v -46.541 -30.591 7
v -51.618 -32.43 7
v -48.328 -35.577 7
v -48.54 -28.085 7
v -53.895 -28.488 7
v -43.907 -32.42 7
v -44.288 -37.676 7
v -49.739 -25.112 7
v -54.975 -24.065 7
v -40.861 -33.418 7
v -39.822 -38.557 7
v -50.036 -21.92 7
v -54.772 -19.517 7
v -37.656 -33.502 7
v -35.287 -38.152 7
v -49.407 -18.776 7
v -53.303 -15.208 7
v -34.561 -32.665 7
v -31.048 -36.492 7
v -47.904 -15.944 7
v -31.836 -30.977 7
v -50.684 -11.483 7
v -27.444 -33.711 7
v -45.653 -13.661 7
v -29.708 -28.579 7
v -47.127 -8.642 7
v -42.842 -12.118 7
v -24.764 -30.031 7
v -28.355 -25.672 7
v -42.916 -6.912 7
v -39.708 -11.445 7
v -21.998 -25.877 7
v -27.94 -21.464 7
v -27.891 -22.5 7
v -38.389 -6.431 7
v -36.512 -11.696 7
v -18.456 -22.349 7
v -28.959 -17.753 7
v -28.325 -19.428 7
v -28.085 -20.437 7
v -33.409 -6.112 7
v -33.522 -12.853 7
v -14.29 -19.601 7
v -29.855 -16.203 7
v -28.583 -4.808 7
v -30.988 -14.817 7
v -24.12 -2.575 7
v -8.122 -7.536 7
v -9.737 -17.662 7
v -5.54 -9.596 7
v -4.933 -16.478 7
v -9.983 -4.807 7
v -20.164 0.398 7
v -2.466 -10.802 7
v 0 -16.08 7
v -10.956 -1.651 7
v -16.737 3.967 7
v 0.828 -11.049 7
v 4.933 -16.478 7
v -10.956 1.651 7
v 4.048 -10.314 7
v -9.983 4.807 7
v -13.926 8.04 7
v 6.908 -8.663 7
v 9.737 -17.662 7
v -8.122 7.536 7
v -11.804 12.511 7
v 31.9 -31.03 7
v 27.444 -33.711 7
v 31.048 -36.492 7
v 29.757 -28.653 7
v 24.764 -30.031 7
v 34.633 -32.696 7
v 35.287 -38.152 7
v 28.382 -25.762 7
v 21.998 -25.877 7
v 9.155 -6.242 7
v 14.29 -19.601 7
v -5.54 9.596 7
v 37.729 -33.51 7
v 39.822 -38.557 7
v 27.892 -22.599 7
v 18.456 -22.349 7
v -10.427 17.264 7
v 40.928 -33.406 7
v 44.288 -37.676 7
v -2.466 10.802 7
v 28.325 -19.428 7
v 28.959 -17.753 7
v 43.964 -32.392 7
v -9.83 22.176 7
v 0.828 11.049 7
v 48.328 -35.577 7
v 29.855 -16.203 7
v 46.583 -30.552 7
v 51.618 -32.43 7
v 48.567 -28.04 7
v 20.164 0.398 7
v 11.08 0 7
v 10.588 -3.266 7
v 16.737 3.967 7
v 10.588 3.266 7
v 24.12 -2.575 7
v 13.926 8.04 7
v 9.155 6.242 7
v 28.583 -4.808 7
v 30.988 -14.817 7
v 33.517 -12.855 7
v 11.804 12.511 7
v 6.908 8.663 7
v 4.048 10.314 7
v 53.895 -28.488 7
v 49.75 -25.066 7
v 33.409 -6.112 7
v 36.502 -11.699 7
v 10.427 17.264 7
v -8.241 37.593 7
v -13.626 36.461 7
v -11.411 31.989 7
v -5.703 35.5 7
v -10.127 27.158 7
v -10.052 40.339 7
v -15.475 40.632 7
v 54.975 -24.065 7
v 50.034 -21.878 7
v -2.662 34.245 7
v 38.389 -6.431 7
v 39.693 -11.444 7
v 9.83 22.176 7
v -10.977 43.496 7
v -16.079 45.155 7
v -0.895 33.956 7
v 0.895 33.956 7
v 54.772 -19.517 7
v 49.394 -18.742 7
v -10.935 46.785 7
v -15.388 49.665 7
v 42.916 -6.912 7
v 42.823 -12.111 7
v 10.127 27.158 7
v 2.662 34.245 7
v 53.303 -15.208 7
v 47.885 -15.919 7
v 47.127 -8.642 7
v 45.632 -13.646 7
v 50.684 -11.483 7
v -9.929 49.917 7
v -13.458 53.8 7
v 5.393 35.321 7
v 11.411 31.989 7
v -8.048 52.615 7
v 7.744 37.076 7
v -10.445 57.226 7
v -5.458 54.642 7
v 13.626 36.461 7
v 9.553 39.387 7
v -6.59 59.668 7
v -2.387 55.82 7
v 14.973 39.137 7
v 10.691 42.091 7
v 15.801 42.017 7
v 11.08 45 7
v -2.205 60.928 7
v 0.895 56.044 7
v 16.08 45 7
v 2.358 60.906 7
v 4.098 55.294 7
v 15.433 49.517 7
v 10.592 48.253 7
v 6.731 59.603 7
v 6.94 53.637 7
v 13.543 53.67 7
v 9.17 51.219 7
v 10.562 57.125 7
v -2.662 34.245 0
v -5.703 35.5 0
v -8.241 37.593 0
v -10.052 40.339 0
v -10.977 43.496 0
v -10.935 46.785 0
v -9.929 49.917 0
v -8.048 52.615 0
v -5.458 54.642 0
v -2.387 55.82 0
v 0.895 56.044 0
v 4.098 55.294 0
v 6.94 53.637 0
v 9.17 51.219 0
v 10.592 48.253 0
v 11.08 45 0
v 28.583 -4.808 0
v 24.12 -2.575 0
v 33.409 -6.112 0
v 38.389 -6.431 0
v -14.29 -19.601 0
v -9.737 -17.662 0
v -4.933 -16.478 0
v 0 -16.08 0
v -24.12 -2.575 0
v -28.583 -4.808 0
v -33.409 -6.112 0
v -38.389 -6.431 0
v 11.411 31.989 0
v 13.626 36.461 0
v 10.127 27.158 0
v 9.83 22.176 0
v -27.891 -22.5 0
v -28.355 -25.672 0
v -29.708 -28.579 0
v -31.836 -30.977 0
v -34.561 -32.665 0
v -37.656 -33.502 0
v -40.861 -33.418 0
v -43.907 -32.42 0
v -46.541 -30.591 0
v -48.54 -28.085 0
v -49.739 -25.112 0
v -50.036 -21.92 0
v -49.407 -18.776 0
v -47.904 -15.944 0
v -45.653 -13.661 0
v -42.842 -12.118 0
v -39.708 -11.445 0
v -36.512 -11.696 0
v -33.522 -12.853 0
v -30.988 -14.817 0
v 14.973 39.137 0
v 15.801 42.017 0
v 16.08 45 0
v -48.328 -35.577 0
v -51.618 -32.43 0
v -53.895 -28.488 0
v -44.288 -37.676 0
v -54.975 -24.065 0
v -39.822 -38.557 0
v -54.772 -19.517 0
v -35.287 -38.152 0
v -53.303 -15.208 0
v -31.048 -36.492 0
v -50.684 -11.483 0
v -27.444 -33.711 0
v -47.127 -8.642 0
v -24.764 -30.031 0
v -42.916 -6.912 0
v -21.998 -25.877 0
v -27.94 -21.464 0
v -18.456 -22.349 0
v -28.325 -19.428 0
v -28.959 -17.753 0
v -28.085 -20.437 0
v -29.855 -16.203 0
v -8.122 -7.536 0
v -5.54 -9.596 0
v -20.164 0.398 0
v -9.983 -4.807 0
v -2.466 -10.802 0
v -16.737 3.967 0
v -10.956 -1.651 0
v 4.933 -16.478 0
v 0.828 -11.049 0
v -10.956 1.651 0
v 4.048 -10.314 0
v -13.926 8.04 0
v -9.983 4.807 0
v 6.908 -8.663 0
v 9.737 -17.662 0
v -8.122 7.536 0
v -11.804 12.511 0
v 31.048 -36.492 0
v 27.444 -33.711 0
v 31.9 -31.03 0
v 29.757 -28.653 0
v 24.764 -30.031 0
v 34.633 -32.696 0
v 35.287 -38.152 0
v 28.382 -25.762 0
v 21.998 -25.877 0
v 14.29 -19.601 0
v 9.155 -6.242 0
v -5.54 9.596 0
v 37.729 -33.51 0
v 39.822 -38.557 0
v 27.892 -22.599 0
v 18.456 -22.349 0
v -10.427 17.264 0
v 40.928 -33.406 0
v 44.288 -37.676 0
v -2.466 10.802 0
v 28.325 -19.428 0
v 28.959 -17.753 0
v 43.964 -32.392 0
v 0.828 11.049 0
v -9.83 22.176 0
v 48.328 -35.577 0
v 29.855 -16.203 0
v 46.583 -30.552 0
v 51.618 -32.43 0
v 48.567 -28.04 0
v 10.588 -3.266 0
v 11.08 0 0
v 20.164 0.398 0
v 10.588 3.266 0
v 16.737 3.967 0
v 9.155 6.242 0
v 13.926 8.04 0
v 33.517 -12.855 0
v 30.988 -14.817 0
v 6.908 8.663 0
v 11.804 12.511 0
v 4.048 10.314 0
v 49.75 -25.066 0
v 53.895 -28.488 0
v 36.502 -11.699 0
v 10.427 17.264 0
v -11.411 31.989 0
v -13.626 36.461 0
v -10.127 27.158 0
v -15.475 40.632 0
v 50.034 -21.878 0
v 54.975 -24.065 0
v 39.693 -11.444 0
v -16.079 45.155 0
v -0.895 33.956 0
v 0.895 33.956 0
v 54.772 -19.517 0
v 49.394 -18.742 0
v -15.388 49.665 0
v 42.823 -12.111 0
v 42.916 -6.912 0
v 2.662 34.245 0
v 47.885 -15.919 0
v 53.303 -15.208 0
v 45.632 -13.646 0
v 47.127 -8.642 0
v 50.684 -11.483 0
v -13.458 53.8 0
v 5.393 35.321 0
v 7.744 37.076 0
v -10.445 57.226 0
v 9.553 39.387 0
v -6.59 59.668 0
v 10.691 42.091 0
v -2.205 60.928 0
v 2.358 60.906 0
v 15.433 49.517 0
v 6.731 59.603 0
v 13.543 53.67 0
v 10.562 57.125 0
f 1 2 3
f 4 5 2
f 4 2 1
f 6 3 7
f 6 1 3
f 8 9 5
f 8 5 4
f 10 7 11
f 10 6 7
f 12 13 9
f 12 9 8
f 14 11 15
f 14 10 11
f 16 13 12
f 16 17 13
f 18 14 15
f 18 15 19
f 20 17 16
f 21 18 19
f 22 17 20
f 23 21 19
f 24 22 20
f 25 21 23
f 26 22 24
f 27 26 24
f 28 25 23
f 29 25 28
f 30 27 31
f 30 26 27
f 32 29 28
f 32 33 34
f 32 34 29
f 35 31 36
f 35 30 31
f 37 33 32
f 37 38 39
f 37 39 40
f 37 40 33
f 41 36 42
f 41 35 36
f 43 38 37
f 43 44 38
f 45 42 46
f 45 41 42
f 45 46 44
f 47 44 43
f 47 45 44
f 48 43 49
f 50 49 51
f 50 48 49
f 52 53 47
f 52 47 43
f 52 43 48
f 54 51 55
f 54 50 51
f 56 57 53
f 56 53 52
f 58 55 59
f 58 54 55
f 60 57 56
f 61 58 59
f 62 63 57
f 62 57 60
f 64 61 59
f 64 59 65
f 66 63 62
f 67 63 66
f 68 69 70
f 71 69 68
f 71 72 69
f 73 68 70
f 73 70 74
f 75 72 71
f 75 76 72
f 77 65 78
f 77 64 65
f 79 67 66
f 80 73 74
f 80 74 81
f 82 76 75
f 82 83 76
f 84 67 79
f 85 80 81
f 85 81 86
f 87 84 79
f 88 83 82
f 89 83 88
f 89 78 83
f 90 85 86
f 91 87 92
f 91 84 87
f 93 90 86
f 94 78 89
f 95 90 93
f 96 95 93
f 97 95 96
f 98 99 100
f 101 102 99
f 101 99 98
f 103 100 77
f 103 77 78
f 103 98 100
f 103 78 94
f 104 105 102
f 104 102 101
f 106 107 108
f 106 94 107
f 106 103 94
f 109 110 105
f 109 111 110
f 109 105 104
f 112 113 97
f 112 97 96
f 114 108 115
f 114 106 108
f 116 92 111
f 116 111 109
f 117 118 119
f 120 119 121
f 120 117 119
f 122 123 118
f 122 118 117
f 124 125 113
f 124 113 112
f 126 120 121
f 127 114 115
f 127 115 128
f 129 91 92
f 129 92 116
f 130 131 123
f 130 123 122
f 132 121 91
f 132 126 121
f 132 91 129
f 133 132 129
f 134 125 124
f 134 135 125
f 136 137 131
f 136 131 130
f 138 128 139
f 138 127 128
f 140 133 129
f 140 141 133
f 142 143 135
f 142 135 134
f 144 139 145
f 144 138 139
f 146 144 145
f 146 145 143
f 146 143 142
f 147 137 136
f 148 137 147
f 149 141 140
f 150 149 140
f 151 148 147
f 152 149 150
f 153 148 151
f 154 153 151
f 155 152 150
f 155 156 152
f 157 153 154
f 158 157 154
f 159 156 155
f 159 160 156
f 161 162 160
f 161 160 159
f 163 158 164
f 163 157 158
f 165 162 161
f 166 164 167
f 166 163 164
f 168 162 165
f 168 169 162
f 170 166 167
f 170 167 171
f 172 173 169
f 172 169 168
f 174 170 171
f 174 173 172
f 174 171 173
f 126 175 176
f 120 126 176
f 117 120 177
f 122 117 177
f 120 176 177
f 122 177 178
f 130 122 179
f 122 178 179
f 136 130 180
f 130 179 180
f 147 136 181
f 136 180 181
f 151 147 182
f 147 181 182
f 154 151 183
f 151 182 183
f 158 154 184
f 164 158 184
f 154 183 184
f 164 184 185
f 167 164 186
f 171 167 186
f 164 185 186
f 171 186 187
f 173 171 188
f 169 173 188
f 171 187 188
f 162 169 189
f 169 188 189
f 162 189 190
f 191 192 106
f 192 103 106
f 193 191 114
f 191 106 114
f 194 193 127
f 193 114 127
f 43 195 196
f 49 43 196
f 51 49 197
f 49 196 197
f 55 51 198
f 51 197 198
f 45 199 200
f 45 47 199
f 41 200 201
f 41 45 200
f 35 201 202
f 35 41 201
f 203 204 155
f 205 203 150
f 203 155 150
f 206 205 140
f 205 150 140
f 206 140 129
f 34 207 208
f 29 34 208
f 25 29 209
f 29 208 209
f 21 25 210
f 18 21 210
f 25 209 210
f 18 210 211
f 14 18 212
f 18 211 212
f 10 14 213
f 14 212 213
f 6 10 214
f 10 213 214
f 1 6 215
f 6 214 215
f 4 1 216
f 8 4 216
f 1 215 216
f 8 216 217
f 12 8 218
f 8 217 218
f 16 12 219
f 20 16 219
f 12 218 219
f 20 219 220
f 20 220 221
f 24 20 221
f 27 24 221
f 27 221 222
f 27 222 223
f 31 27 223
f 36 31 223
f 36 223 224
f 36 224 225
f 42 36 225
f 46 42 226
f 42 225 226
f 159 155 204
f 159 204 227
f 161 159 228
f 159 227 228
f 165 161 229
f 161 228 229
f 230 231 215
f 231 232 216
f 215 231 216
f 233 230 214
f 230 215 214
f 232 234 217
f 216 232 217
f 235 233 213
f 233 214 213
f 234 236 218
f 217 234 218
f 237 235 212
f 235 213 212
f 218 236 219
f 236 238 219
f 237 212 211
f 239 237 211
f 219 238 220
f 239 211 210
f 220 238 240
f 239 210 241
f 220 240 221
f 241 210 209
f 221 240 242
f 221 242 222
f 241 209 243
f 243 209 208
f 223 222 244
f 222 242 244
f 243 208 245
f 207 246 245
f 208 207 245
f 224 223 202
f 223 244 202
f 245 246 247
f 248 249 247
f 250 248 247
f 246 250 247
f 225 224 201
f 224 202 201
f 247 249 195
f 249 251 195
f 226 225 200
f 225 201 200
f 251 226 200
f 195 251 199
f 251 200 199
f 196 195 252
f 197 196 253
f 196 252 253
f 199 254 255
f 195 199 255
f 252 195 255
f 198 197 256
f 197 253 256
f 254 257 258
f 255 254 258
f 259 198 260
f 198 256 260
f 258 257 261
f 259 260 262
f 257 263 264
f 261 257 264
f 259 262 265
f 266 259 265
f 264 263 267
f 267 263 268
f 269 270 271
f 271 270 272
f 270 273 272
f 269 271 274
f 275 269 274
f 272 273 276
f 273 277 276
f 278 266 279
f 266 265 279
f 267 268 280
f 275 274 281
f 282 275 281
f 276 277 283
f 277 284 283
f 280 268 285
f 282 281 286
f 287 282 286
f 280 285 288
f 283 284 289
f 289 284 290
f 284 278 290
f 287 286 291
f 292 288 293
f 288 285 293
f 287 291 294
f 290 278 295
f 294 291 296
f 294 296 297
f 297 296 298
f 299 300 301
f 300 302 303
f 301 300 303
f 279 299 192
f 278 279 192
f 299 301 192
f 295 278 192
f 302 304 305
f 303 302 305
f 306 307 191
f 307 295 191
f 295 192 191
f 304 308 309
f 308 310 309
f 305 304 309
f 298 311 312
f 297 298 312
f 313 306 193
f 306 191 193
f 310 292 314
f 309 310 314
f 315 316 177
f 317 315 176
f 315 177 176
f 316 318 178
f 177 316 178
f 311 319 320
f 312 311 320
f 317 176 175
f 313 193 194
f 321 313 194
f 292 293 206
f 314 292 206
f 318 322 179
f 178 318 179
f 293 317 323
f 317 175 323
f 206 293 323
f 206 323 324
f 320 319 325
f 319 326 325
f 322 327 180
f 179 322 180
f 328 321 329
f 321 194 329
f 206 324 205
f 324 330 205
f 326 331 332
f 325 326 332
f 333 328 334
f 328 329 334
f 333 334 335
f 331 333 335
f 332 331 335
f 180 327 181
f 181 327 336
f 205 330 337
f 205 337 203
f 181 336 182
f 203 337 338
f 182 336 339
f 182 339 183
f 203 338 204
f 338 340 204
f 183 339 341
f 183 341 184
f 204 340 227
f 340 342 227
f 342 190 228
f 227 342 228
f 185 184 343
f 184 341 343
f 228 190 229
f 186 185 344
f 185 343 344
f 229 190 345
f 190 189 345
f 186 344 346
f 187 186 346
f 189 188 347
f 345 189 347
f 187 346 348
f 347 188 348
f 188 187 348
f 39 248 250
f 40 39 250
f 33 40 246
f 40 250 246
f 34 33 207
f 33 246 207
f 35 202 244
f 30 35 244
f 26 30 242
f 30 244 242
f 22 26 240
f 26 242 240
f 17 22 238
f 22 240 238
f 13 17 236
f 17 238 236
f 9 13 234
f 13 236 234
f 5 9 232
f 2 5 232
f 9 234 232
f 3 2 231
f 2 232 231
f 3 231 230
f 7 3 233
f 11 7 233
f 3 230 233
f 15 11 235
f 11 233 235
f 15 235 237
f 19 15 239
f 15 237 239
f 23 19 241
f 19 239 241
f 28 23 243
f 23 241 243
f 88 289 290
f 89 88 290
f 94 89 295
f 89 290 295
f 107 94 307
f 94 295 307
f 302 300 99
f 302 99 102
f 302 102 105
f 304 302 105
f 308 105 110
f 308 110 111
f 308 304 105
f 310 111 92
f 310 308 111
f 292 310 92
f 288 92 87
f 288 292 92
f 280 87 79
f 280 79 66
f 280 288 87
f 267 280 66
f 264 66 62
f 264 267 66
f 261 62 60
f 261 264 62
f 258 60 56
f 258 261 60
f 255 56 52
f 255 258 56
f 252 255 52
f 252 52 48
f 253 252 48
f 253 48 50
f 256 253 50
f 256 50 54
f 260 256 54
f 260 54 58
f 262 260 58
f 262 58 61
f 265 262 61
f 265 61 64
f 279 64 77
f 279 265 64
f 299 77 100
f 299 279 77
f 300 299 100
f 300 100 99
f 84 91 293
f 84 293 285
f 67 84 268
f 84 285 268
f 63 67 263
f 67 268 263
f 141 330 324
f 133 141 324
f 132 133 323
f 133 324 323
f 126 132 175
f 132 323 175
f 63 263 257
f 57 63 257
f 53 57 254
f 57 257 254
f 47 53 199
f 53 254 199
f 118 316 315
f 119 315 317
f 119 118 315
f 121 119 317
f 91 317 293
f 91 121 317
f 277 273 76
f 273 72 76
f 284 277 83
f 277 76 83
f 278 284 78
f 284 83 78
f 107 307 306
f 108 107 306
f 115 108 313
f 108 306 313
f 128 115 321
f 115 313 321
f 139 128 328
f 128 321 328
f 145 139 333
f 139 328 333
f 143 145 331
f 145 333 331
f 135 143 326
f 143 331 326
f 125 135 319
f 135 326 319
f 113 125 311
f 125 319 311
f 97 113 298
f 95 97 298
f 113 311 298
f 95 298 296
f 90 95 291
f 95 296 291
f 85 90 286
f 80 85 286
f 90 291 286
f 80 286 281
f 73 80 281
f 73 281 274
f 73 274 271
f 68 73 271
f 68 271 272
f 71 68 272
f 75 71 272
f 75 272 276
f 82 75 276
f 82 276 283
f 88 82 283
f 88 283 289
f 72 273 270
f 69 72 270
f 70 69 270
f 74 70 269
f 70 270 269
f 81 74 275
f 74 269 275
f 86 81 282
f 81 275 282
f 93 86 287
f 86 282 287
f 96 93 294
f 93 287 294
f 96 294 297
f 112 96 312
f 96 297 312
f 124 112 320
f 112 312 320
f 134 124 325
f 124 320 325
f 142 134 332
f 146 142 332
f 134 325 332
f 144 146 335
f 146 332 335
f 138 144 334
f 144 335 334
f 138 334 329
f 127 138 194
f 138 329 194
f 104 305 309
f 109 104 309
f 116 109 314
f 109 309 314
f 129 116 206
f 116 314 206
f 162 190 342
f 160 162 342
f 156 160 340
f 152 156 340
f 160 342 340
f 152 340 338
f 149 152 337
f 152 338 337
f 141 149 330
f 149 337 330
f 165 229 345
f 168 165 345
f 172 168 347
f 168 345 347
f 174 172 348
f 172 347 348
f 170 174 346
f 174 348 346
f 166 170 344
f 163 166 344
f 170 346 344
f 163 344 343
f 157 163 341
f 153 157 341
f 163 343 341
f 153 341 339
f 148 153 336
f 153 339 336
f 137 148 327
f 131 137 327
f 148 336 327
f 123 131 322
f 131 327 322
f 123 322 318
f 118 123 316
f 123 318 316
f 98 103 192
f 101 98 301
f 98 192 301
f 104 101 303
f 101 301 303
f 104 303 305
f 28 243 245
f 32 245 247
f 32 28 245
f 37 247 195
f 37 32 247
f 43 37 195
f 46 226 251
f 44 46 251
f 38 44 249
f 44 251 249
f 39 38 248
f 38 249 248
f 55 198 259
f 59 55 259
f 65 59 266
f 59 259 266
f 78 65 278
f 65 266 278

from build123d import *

# Parameters (mm, degrees)
F0_R     = 11.08
F1_DEPTH = 7
F2_R     = 25


with BuildPart() as f1:
    # F0 (on Top) → F1 (new body)
    with BuildSketch(Plane.XY):
        with BuildLine():
            ThreePointArc((2.6624965293, 34.2446519242), (3.3990862891, 31.8515325068), (4.1848381854, 29.4741013348))
            ThreePointArc((4.1848381854, 29.4741013348), (8.2251664175, 31.1828715934), (11.6533257056, 33.92))
            ThreePointArc((11.6533257056, 33.92), (14.9323788685, 39.0342258401), (16.08, 45))
            ThreePointArc((16.08, 45), (-5.9657741599, 59.9323788685), (-11.6533257056, 33.92))
            ThreePointArc((-11.6533257056, 33.92), (-8.2251664175, 31.1828715934), (-4.1848381854, 29.4741013348))
            ThreePointArc((-4.1848381854, 29.4741013348), (-3.3990862891, 31.8515325068), (-2.6624965293, 34.2446519242))
            ThreePointArc((-2.6624965293, 34.2446519242), (-6.8288336653, 53.7254473107), (11.08, 45))
            ThreePointArc((11.08, 45), (8.7254473107, 38.1711663347), (2.6624965293, 34.2446519242))
        make_face()
        with BuildLine():
            ThreePointArc((-11.6533257056, 33.92), (-9.9229010426, 20.728301046), (-13.9256884929, 8.04))
            ThreePointArc((-13.9256884929, 8.04), (-8.5348333079, 18.5205382543), (-4.1848381854, 29.4741013348))
            ThreePointArc((-4.1848381854, 29.4741013348), (-8.2251664175, 31.1828715934), (-11.6533257056, 33.92))
        make_face()
        with BuildLine():
            ThreePointArc((-4.1848381854, 29.4741013348), (0, 28.92), (4.1848381854, 29.4741013348))
            ThreePointArc((4.1848381854, 29.4741013348), (3.3990862891, 31.8515325068), (2.6624965293, 34.2446519242))
            ThreePointArc((2.6624965293, 34.2446519242), (0, 33.92), (-2.6624965293, 34.2446519242))
            ThreePointArc((-2.6624965293, 34.2446519242), (-3.3990862891, 31.8515325068), (-4.1848381854, 29.4741013348))
        make_face()
        with BuildLine():
            ThreePointArc((-13.9256884929, 8.04), (0, 16.08), (13.9256884929, 8.04))
            ThreePointArc((13.9256884929, 8.04), (8.5348333079, 18.5205382543), (4.1848381854, 29.4741013348))
            ThreePointArc((4.1848381854, 29.4741013348), (0, 28.92), (-4.1848381854, 29.4741013348))
            ThreePointArc((-4.1848381854, 29.4741013348), (-8.5348333079, 18.5205382543), (-13.9256884929, 8.04))
        make_face()
        with BuildLine():
            ThreePointArc((4.1848381854, 29.4741013348), (8.5348333079, 18.5205382543), (13.9256884929, 8.04))
            ThreePointArc((13.9256884929, 8.04), (9.9229010426, 20.728301046), (11.6533257056, 33.92))
            ThreePointArc((11.6533257056, 33.92), (8.2251664175, 31.1828715934), (4.1848381854, 29.4741013348))
        make_face()
        with BuildLine():
            ThreePointArc((-22.8911431703, -22.5), (-23.0271579816, -20.4129599182), (-23.4329014169, -18.3612268467))
            ThreePointArc((-23.4329014169, -18.3612268467), (-25.8846931558, -18.8694613295), (-28.3254902455, -19.4281155939))
            ThreePointArc((-28.3254902455, -19.4281155939), (-28.0002673072, -20.948780223), (-27.8911431703, -22.5))
            ThreePointArc((-27.8911431703, -22.5), (-49.247810258, -26.6420421978), (-30.9879867747, -14.8165363303))
            ThreePointArc((-30.9879867747, -14.8165363303), (-29.2837794449, -12.9820711774), (-27.6177396024, -11.1128744881))
            ThreePointArc((-27.6177396024, -11.1128744881), (-31.1177421715, -8.4682327288), (-35.2022445492, -6.8679239004))
            ThreePointArc((-35.2022445492, -6.8679239004), (-52.8968316632, -30.54), (-23.5489188436, -27.0520760996))
            ThreePointArc((-23.5489188436, -27.0520760996), (-23.0564366513, -24.7996774585), (-22.8911431703, -22.5))
        make_face()
        with BuildLine():
            ThreePointArc((-28.3254902455, -19.4281155939), (-25.8846931558, -18.8694613295), (-23.4329014169, -18.3612268467))
            ThreePointArc((-23.4329014169, -18.3612268467), (-25.0454546774, -14.46), (-27.6177396024, -11.1128744881))
            ThreePointArc((-27.6177396024, -11.1128744881), (-29.2837794449, -12.9820711774), (-30.9879867747, -14.8165363303))
            ThreePointArc((-30.9879867747, -14.8165363303), (-29.3755816964, -16.96), (-28.3254902455, -19.4281155939))
        make_face()
        with BuildLine():
            ThreePointArc((-27.6177396024, -11.1128744881), (-20.3066732739, -1.8688866654), (-13.9256884929, 8.04))
            ThreePointArc((-13.9256884929, 8.04), (-22.9126858044, -1.7706661409), (-35.2022445492, -6.8679239004))
            ThreePointArc((-35.2022445492, -6.8679239004), (-31.1177421715, -8.4682327288), (-27.6177396024, -11.1128744881))
        make_face()
        with BuildLine():
            ThreePointArc((-23.4329014169, -18.3612268467), (-11.771839966, -16.6516515888), (0, -16.08))
            ThreePointArc((0, -16.08), (-13.9256884929, -8.04), (-13.9256884929, 8.04))
            ThreePointArc((-13.9256884929, 8.04), (-20.3066732739, -1.8688866654), (-27.6177396024, -11.1128744881))
            ThreePointArc((-27.6177396024, -11.1128744881), (-25.0454546774, -14.46), (-23.4329014169, -18.3612268467))
        make_face()
        with BuildLine():
            ThreePointArc((-23.5489188436, -27.0520760996), (-12.9897847619, -18.9576349051), (0, -16.08))
            ThreePointArc((0, -16.08), (-11.771839966, -16.6516515888), (-23.4329014169, -18.3612268467))
            ThreePointArc((-23.4329014169, -18.3612268467), (-23.0271579816, -20.4129599182), (-22.8911431703, -22.5))
            ThreePointArc((-22.8911431703, -22.5), (-23.0564366513, -24.7996774585), (-23.5489188436, -27.0520760996))
        make_face()
        with BuildLine():
            ThreePointArc((13.9256884929, 8.04), (15.5320872867, 4.1618102452), (16.08, 0))
            ThreePointArc((16.08, 0), (11.3702770415, -11.3702770415), (0, -16.08))
            ThreePointArc((0, -16.08), (11.771839966, -16.6516515888), (23.4329014169, -18.3612268467))
            ThreePointArc((23.4329014169, -18.3612268467), (25.0454546774, -14.46), (27.6177396024, -11.1128744881))
            ThreePointArc((27.6177396024, -11.1128744881), (20.3066732739, -1.8688866654), (13.9256884929, 8.04))
        make_face()
        with BuildLine():
            ThreePointArc((23.4329014169, -18.3612268467), (11.771839966, -16.6516515888), (0, -16.08))
            ThreePointArc((0, -16.08), (12.9897847619, -18.9576349051), (23.5489188436, -27.0520760996))
            ThreePointArc((23.5489188436, -27.0520760996), (22.8925757541, -22.7146388646), (23.4329014169, -18.3612268467))
        make_face()
        with BuildLine():
            ThreePointArc((35.2022445492, -6.8679239004), (22.9126858044, -1.7706661409), (13.9256884929, 8.04))
            ThreePointArc((13.9256884929, 8.04), (20.3066732739, -1.8688866654), (27.6177396024, -11.1128744881))
            ThreePointArc((27.6177396024, -11.1128744881), (31.1177421715, -8.4682327288), (35.2022445492, -6.8679239004))
        make_face()
        with BuildLine():
            ThreePointArc((35.2022445492, -6.8679239004), (31.1177421715, -8.4682327288), (27.6177396024, -11.1128744881))
            ThreePointArc((27.6177396024, -11.1128744881), (29.2837794449, -12.9820711774), (30.9879867747, -14.8165363303))
            ThreePointArc((30.9879867747, -14.8165363303), (43.1131853681, -12.2233329123), (50.0511431703, -22.5))
            ThreePointArc((50.0511431703, -22.5), (37.4199233933, -33.4708758631), (28.3254902455, -19.4281155939))
            ThreePointArc((28.3254902455, -19.4281155939), (25.8846931558, -18.8694613295), (23.4329014169, -18.3612268467))
            ThreePointArc((23.4329014169, -18.3612268467), (22.8925757541, -22.7146388646), (23.5489188436, -27.0520760996))
            ThreePointArc((23.5489188436, -27.0520760996), (41.2708206288, -38.414706519), (55.0511431703, -22.5))
            ThreePointArc((55.0511431703, -22.5), (48.9200755294, -9.86729859), (35.2022445492, -6.8679239004))
        make_face()
        with BuildLine():
            ThreePointArc((30.9879867747, -14.8165363303), (29.2837794449, -12.9820711774), (27.6177396024, -11.1128744881))
            ThreePointArc((27.6177396024, -11.1128744881), (25.0454546774, -14.46), (23.4329014169, -18.3612268467))
            ThreePointArc((23.4329014169, -18.3612268467), (25.8846931558, -18.8694613295), (28.3254902455, -19.4281155939))
            ThreePointArc((28.3254902455, -19.4281155939), (29.3755816964, -16.96), (30.9879867747, -14.8165363303))
        make_face()
        with BuildLine():
            ThreePointArc((0, -16.08), (11.3702770415, -11.3702770415), (16.08, 0))
            ThreePointArc((16.08, 0), (15.5320872867, 4.1618102452), (13.9256884929, 8.04))
            ThreePointArc((13.9256884929, 8.04), (0, 16.08), (-13.9256884929, 8.04))
            ThreePointArc((-13.9256884929, 8.04), (-13.9256884929, -8.04), (0, -16.08))
        make_face()
        Circle(F0_R, mode=Mode.SUBTRACT)
    extrude(amount=F1_DEPTH)

    # F2
    f2_edges = [f1.edges().sort_by_distance(p)[0] for p in [
        (11.653326, 33.92, 3.5),
        (-11.653326, 33.92, 3.5),
        (35.202245, -6.867924, 3.5),
        (23.548919, -27.052076, 3.5),
        (-23.548919, -27.052076, 3.5),
        (-35.202245, -6.867924, 3.5),
    ]]
    fillet(f2_edges, radius=F2_R)


solid = f1.part
